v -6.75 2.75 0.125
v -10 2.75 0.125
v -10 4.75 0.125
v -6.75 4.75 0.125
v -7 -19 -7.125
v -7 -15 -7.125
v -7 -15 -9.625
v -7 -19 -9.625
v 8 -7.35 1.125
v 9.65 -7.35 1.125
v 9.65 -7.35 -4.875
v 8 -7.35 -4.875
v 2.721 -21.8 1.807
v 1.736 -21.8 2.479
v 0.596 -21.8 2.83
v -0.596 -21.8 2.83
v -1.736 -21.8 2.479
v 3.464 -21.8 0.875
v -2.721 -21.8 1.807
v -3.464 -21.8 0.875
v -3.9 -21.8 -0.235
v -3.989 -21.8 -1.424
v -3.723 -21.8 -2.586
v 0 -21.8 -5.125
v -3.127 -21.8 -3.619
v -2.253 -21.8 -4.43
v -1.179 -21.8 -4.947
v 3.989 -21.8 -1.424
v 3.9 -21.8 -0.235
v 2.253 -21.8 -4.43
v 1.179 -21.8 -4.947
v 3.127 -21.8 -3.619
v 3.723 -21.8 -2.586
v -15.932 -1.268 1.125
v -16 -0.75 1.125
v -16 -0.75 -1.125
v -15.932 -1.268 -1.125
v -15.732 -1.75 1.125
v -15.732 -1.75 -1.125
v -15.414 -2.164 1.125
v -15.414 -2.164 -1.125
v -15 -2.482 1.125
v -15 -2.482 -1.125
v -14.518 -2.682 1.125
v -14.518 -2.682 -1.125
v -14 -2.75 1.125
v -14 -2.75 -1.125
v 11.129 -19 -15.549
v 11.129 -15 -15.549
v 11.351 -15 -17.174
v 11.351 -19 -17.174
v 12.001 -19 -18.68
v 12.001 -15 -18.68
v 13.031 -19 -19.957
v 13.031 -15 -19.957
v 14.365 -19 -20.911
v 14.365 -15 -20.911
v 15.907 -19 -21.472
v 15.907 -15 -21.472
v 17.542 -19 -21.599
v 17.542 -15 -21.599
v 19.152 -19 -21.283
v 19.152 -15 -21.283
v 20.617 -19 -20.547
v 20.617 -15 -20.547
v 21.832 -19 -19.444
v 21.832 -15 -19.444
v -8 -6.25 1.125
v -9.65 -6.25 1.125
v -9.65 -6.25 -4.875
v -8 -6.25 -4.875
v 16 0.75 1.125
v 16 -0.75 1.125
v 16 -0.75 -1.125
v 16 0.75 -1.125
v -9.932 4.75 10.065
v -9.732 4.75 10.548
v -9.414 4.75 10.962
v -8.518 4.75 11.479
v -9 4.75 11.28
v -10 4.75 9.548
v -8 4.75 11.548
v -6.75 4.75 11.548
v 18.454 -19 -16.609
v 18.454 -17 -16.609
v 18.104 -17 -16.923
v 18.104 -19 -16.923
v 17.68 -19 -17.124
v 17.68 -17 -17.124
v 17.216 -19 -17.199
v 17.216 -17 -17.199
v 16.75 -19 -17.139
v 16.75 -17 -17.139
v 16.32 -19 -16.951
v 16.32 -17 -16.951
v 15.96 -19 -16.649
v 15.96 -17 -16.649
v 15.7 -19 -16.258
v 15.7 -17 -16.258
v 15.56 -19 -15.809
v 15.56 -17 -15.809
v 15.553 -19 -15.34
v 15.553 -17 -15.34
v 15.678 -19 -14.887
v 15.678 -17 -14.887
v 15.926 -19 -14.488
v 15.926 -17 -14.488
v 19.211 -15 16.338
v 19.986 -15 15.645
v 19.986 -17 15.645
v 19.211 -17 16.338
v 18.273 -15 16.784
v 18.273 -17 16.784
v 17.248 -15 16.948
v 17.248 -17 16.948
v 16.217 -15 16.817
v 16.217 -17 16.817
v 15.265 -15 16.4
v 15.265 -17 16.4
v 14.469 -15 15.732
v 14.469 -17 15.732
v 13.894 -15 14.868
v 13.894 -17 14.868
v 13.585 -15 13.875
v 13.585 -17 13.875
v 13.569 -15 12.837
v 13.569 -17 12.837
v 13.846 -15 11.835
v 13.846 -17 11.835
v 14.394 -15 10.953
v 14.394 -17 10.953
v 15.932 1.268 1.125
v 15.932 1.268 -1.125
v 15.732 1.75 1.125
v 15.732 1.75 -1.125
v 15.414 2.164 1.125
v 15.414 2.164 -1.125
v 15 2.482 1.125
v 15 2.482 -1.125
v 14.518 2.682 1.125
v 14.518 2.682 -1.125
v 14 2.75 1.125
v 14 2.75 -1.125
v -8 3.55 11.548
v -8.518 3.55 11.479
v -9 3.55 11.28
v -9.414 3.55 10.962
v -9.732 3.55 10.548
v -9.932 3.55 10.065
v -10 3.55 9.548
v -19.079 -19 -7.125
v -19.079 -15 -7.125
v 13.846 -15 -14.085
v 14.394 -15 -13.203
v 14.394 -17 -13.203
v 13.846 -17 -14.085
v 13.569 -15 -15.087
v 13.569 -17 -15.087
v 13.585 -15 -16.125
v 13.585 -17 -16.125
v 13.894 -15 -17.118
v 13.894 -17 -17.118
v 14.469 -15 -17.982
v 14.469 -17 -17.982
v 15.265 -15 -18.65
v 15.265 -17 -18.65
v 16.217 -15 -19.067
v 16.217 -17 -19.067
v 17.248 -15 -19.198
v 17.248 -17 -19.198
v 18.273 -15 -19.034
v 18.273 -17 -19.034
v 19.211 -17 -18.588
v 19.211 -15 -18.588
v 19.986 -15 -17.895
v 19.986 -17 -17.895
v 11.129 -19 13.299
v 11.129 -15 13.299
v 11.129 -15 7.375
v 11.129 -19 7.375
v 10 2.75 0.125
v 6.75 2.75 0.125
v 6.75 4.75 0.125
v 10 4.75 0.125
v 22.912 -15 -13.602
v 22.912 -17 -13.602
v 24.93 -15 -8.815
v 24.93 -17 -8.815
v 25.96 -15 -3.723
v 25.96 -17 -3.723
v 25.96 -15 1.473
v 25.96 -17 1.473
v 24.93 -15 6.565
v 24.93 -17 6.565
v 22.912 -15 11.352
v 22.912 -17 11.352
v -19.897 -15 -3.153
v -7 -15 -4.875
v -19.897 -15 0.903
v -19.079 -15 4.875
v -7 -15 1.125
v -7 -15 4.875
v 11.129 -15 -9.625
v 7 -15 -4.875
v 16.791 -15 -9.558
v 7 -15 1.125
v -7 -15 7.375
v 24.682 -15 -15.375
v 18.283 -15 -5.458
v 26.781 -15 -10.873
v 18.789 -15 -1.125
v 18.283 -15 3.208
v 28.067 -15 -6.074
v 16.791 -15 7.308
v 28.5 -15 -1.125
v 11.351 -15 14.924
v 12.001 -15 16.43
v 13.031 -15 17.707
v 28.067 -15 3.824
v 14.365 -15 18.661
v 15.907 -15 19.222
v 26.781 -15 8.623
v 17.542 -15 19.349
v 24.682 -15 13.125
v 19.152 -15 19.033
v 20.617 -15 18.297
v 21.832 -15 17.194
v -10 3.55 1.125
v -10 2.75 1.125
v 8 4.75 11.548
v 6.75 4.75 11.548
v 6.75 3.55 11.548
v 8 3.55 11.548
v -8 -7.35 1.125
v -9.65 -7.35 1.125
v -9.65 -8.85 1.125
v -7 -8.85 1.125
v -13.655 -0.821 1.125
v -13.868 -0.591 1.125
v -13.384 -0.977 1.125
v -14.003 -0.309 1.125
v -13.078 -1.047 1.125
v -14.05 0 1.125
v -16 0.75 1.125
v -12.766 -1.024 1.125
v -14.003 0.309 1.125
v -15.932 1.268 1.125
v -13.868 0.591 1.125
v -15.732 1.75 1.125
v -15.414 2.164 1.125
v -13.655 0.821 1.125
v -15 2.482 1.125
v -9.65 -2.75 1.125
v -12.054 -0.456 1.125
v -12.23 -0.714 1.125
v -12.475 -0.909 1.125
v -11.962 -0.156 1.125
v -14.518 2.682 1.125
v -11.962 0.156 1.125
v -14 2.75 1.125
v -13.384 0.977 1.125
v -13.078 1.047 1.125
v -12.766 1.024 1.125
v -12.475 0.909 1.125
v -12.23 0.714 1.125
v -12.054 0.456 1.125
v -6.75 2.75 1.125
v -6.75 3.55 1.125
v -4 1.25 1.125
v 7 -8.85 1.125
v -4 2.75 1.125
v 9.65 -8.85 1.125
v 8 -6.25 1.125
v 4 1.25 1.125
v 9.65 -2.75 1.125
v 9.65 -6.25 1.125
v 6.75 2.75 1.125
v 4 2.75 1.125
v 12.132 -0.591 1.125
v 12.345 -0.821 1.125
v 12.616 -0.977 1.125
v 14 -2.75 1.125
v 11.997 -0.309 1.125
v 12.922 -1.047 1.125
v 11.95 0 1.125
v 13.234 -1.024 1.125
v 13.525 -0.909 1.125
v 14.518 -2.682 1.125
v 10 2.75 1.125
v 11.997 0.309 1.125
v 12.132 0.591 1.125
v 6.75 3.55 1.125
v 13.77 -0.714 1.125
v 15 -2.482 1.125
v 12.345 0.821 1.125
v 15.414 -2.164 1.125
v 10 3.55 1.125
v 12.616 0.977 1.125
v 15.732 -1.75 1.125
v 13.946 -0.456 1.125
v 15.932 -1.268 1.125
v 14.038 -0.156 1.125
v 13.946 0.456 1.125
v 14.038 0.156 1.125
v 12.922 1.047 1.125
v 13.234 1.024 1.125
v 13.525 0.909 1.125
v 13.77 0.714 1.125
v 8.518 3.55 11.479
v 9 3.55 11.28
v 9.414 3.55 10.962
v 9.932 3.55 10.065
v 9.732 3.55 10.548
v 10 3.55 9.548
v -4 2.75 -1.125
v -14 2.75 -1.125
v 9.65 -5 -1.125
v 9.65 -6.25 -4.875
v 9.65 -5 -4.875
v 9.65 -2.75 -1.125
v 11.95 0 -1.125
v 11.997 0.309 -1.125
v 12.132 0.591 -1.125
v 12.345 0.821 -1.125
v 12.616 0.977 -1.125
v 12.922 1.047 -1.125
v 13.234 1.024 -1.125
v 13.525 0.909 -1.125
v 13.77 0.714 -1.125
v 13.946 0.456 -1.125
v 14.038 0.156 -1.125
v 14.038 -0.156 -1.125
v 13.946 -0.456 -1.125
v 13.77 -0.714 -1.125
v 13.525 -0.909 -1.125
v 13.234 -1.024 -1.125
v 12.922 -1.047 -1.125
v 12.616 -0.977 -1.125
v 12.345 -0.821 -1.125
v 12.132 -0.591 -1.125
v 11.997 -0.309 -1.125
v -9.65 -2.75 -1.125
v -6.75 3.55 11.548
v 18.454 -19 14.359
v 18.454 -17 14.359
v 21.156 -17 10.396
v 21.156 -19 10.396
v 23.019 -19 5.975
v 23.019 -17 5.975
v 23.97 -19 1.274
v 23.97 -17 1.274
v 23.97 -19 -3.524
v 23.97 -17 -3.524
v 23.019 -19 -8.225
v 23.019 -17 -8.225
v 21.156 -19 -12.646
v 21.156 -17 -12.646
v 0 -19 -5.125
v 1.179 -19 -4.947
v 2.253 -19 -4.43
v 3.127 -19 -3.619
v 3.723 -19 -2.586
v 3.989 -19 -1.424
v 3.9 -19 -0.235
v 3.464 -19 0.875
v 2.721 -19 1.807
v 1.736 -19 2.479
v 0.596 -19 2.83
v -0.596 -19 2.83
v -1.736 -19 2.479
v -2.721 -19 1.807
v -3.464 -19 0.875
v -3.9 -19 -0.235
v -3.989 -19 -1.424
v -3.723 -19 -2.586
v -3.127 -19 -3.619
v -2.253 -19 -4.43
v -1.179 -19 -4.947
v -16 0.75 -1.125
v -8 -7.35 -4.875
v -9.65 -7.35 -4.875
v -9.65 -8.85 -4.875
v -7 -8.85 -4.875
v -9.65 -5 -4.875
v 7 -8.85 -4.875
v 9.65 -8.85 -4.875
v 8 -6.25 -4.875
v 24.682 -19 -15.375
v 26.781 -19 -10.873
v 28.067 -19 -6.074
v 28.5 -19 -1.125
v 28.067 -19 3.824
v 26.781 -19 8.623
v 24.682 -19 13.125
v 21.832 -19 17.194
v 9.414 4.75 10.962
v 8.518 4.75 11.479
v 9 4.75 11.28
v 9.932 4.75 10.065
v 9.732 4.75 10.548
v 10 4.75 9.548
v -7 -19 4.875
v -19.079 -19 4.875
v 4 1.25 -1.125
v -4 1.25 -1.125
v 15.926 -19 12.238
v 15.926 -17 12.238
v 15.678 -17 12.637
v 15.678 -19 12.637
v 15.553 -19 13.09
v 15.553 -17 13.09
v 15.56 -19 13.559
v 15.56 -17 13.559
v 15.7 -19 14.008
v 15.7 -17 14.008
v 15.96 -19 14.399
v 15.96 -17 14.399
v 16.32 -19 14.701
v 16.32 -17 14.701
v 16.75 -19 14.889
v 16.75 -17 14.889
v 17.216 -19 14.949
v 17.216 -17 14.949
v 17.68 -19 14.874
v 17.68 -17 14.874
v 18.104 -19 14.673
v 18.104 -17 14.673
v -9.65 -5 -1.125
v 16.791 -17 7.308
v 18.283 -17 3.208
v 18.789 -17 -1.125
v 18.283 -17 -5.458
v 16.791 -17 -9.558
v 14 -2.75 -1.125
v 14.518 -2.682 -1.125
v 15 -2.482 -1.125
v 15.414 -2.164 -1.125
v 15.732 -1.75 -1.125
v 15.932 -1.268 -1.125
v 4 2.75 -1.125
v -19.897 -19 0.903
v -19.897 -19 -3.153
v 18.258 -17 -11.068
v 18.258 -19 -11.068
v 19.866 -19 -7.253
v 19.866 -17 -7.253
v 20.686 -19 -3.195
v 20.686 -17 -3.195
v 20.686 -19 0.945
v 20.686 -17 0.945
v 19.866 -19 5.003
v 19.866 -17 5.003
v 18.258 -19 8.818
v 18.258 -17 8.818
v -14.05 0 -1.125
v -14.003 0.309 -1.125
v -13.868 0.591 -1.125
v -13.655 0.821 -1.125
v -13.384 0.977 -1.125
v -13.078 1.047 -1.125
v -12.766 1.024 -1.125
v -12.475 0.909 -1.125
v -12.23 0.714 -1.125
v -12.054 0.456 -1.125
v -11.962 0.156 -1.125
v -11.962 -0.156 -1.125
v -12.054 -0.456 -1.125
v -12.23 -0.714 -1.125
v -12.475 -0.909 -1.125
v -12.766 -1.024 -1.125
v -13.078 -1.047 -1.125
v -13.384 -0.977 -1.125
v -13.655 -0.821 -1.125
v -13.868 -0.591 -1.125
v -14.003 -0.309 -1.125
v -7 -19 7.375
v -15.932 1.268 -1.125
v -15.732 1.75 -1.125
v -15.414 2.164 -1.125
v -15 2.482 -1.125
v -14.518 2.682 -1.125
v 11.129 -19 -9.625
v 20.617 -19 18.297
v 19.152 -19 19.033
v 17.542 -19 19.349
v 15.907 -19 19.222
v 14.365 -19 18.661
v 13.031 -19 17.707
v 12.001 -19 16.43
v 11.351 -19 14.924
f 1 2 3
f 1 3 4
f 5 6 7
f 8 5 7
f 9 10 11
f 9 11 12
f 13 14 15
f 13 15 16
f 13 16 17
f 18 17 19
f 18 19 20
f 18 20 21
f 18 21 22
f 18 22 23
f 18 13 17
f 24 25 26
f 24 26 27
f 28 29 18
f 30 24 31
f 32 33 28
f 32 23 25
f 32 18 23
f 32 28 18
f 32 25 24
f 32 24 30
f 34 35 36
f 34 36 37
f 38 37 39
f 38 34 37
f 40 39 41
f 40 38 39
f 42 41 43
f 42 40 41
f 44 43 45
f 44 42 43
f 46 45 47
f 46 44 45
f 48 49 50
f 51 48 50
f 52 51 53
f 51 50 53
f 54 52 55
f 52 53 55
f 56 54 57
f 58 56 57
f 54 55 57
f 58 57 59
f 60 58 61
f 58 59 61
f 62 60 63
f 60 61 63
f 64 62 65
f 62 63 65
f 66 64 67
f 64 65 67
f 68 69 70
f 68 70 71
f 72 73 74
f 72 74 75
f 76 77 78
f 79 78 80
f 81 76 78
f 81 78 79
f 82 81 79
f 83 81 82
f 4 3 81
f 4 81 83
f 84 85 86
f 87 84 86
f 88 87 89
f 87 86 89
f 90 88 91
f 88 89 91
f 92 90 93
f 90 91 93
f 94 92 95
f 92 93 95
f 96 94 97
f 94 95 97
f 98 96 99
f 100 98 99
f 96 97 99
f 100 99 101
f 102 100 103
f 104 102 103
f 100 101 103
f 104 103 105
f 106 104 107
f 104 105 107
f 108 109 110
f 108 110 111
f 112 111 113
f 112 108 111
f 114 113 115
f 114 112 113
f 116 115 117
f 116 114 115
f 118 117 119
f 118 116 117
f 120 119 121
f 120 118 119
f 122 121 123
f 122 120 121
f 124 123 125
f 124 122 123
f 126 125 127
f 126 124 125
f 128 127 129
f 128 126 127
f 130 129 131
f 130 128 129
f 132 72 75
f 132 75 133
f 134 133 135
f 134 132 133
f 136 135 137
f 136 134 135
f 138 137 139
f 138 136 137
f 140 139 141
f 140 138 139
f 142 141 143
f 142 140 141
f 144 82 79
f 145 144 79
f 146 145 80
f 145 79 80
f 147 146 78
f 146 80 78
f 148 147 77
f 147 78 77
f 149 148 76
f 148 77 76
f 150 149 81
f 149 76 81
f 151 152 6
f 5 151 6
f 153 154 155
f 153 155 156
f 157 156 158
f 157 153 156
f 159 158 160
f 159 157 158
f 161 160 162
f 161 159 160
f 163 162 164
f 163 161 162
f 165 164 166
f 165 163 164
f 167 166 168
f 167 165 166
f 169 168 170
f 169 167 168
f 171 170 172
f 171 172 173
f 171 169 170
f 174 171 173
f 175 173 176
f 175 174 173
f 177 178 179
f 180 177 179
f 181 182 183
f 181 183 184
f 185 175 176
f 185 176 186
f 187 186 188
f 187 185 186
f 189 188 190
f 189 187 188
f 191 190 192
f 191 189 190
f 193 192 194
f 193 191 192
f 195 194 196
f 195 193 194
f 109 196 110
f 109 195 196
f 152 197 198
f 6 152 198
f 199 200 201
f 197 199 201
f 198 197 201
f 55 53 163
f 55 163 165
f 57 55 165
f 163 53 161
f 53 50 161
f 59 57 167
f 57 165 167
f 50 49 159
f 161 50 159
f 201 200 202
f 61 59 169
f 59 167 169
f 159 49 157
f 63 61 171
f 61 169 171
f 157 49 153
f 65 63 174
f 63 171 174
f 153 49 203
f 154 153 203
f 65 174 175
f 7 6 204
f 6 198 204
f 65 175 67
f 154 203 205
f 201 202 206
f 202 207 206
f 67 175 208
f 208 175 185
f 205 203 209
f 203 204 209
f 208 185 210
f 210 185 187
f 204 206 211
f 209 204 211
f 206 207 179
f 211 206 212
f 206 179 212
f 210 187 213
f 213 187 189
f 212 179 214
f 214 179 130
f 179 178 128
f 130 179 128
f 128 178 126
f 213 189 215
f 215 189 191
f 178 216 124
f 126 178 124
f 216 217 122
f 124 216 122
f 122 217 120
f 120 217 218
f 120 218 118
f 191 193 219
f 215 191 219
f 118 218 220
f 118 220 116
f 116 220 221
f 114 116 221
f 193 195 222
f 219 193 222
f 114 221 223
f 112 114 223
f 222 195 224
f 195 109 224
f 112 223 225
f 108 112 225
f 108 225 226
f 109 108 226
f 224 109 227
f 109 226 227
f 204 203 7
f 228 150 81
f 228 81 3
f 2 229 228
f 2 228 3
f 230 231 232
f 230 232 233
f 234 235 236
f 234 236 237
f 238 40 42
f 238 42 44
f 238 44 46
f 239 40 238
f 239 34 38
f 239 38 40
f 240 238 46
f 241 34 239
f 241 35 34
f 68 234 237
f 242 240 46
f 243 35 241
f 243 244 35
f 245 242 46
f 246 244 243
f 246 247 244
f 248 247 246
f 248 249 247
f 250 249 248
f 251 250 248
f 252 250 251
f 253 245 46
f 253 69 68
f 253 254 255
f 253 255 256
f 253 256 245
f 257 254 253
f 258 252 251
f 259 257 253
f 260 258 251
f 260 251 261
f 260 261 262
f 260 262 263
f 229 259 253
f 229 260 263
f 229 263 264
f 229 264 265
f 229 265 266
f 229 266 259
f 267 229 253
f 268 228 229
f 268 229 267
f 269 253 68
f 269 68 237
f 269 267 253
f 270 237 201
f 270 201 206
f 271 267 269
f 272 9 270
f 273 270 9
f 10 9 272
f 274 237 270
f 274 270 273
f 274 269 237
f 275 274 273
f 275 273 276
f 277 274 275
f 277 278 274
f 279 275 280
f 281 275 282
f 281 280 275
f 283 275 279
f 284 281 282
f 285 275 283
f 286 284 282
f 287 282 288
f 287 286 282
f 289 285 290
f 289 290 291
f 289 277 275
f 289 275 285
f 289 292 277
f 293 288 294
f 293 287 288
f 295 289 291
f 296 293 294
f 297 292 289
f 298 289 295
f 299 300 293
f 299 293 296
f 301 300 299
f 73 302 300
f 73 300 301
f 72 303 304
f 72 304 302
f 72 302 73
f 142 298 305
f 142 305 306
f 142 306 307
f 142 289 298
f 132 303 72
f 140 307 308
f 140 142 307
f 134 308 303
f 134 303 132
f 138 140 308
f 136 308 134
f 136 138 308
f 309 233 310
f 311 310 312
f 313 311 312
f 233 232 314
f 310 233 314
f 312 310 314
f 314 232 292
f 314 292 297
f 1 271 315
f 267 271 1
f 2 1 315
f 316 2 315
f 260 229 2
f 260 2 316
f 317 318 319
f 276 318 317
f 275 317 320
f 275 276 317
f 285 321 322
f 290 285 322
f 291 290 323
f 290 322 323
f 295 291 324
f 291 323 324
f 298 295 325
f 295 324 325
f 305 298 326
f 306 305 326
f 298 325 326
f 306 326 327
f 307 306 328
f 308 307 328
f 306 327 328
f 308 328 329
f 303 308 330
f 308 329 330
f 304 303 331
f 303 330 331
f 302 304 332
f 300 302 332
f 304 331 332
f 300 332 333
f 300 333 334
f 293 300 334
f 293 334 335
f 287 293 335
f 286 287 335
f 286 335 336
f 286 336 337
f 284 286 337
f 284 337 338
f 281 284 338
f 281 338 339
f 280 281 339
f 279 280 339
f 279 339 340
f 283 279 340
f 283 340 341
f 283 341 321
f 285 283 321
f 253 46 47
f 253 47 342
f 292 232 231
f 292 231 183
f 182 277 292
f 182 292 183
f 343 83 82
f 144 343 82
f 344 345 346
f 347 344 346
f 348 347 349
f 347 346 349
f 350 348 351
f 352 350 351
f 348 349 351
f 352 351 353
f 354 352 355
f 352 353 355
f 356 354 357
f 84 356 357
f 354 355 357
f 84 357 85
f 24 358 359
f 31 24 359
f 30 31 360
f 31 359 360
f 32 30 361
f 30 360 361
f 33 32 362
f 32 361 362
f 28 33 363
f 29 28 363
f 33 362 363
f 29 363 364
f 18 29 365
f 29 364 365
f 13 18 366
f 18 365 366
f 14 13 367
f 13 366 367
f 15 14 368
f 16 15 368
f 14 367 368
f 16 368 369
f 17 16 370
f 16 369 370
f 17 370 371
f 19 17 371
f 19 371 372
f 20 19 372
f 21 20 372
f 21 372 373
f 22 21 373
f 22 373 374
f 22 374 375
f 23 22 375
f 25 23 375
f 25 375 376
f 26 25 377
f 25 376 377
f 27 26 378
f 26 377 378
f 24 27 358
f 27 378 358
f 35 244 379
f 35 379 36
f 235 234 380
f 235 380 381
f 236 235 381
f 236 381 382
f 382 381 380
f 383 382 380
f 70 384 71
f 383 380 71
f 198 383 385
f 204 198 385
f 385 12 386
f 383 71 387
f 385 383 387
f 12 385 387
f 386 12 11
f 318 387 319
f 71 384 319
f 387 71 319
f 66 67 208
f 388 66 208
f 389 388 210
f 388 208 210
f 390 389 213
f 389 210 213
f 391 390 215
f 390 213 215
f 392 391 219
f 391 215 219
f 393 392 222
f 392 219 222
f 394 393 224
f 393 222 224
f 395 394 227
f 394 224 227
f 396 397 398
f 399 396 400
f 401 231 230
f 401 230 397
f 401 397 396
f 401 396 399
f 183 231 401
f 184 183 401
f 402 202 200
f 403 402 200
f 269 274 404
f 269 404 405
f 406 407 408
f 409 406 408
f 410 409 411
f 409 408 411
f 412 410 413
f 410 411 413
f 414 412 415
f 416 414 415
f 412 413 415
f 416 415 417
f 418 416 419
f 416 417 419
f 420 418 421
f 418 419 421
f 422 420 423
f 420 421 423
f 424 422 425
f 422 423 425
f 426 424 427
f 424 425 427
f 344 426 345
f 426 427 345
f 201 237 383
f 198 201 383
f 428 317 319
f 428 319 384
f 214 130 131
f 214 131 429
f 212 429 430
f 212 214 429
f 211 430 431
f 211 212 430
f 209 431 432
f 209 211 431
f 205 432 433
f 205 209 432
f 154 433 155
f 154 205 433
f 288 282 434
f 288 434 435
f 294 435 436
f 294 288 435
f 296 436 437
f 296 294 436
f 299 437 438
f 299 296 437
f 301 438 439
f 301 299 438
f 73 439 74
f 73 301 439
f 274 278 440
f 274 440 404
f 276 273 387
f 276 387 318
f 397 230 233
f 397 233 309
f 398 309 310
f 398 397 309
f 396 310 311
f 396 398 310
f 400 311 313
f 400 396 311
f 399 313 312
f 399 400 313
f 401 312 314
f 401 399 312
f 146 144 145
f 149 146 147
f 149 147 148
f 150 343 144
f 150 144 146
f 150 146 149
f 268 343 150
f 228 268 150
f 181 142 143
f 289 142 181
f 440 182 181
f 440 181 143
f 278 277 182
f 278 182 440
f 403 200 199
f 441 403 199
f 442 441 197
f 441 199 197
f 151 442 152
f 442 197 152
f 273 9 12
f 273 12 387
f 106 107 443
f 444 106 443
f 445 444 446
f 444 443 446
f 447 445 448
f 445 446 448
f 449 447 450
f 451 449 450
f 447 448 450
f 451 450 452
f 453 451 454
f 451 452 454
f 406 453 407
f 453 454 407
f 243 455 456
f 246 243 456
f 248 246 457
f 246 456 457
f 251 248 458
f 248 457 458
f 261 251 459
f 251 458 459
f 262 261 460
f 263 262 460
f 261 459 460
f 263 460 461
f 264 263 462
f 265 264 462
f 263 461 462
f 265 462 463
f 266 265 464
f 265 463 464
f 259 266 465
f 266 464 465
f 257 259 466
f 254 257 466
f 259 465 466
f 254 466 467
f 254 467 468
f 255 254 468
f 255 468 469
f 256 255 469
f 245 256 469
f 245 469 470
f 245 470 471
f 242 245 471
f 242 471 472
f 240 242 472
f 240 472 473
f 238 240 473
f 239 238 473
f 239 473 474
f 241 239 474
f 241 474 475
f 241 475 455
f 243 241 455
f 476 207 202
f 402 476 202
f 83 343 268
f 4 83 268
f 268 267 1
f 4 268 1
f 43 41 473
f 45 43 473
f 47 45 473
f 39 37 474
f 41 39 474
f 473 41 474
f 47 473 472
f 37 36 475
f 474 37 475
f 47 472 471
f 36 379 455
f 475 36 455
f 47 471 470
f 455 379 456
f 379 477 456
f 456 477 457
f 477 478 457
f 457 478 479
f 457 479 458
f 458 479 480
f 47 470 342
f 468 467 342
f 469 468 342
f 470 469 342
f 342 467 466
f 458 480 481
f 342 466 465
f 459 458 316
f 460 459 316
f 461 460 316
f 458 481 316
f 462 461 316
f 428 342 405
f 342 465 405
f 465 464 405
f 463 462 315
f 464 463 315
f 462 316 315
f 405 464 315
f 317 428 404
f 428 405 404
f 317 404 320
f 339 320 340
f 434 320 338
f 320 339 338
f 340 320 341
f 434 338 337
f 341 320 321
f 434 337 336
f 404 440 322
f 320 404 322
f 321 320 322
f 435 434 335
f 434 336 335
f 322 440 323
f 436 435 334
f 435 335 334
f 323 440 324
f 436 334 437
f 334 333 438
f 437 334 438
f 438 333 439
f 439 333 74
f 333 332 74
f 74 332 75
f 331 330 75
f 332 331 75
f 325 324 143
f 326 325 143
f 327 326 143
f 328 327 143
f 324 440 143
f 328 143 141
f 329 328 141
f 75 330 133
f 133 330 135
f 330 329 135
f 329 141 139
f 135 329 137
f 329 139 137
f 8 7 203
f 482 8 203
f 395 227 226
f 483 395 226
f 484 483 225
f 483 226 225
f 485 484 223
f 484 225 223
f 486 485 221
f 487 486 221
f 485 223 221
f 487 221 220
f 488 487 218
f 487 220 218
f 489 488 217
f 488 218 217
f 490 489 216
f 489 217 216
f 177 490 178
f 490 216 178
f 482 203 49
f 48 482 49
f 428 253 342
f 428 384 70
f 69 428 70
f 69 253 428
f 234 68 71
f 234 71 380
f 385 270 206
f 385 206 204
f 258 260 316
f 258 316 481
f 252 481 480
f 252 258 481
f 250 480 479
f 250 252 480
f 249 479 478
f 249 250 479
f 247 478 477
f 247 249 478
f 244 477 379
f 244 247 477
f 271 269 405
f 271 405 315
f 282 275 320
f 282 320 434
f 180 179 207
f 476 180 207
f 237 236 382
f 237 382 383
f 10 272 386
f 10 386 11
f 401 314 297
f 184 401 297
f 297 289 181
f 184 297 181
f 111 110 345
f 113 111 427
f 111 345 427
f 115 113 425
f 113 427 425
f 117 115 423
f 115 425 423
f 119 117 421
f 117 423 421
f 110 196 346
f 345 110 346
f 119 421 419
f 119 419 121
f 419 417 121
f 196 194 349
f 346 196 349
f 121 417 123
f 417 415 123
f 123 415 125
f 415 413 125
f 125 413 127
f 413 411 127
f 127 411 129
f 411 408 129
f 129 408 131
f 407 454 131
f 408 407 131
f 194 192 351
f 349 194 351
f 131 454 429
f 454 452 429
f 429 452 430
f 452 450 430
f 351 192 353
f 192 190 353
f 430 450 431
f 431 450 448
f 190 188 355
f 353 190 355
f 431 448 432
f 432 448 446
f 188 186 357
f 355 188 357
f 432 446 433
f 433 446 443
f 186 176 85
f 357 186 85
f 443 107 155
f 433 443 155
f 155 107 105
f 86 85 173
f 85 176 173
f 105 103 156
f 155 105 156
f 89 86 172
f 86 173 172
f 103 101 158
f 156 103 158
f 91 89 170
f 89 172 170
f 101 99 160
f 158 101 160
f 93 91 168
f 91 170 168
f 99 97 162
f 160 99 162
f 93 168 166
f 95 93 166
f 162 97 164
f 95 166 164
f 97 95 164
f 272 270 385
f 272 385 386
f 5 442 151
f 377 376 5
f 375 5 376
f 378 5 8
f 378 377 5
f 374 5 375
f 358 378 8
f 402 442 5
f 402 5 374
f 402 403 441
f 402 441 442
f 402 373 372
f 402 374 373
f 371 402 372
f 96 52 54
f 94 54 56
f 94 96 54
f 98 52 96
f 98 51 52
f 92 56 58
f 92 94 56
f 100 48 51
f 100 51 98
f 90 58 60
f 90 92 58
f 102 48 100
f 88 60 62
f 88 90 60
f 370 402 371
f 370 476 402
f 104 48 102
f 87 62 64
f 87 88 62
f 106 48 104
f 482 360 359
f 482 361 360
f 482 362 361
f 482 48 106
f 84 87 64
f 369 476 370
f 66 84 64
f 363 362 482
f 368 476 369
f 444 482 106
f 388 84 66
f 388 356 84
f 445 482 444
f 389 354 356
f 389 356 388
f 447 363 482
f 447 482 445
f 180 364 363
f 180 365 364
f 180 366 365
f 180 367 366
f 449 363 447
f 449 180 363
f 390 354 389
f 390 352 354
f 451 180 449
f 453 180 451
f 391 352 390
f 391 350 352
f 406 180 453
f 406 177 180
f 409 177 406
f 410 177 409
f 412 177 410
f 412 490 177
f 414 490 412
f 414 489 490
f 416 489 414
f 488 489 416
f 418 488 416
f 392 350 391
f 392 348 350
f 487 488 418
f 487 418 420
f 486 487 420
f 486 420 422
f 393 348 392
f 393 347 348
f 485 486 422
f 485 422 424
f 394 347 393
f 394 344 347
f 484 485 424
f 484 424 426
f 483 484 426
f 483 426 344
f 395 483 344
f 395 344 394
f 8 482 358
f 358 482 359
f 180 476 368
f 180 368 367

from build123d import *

# Parameters (mm, degrees)
BOSS_EXTRUDE1_DEPTH    = 1.125
M1_8_CLEARANCE_HOLE1_D = 2.1
BOSS_EXTRUDE3_DEPTH    = 4
SKETCH10_R             = 4
BOSS_EXTRUDE4_DEPTH    = 2.8
CUT_EXTRUDE1_DEPTH     = 2
BOSS_EXTRUDE9_DEPTH    = 6
SKETCH21_W             = 3.25
SKETCH21_H             = 1
BOSS_EXTRUDE10_DEPTH   = 2
BOSS_EXTRUDE13_DEPTH   = 1.2
SKETCH25_W             = 14
SKETCH25_H             = 3.75
BOSS_EXTRUDE12_DEPTH   = 10


with BuildPart() as part:
    # Sketch1 → Boss-Extrude1 (new, symmetric)
    with BuildSketch(Plane.XY):
        with BuildLine():
            Line((-7, -8.85), (-7, -15))
            Line((-7, -15), (7, -15))
            Line((7, -15), (7, -8.85))
            Line((7, -8.85), (9.65, -8.85))
            Line((9.65, -8.85), (9.65, -7.35))
            Line((9.65, -7.35), (8, -7.35))
            Line((8, -7.35), (8, -6.25))
            Line((8, -6.25), (9.65, -6.25))
            Line((9.65, -6.25), (9.65, -2.75))
            Line((9.65, -2.75), (14, -2.75))
            ThreePointArc((14, -2.75), (15.414213562, -2.164213562), (16, -0.75))
            Line((16, -0.75), (16, 0.75))
            ThreePointArc((16, 0.75), (15.414213562, 2.164213562), (14, 2.75))
            Line((14, 2.75), (4, 2.75))
            Line((4, 2.75), (4, 1.25))
            Line((4, 1.25), (-4, 1.25))
            Line((-4, 1.25), (-4, 2.75))
            Line((-4, 2.75), (-14, 2.75))
            ThreePointArc((-14, 2.75), (-15.414213562, 2.164213562), (-16, 0.75))
            Line((-16, 0.75), (-16, -0.75))
            ThreePointArc((-16, -0.75), (-15.414213562, -2.164213562), (-14, -2.75))
            Line((-14, -2.75), (-9.65, -2.75))
            Line((-9.65, -2.75), (-9.65, -6.25))
            Line((-9.65, -6.25), (-8, -6.25))
            Line((-8, -6.25), (-8, -7.35))
            Line((-8, -7.35), (-9.65, -7.35))
            Line((-9.65, -7.35), (-9.65, -8.85))
            Line((-9.65, -8.85), (-7, -8.85))
        make_face()
    extrude(amount=BOSS_EXTRUDE1_DEPTH, both=True)

    # M1.8 Clearance Hole1 (through all)
    with Locations(Plane.XY.offset(1.125)):
        with Locations((-13, 0), (13, 0)):
            Hole(M1_8_CLEARANCE_HOLE1_D / 2)

    # Sketch8 → Boss-Extrude3 (add)
    with BuildSketch(Plane.XZ.offset(15)):
        with BuildLine():
            Line((-7, -7.125), (-7, -9.625))
            Line((-7, -9.625), (11.129010548, -9.625))
            Line((11.129010548, -9.625), (11.129010548, -15.548780253))
            ThreePointArc((11.129010548, -15.548780253), (15.116751021, -21.24386386), (21.832266629, -19.444446876))
            ThreePointArc((21.832266629, -19.444446876), (28.5, -1.125), (21.832266629, 17.194446876))
            ThreePointArc((21.832266629, 17.194446876), (15.116751021, 18.99386386), (11.129010548, 13.298780253))
            Line((11.129010548, 13.298780253), (11.129010548, 7.375))
            Line((11.129010548, 7.375), (-7, 7.375))
            Line((-7, 7.375), (-7, 4.875))
            Line((-7, 4.875), (-19.078784028, 4.875))
            ThreePointArc((-19.078784028, 4.875), (-20, -1.125), (-19.078784028, -7.125))
            Line((-19.078784028, -7.125), (-7, -7.125))
        make_face()
        with BuildLine():
            ThreePointArc((15.925618604, -14.488180697), (20.789418613, -1.125), (15.925618604, 12.238180697))
            ThreePointArc((15.925618604, 12.238180697), (16.128992379, 14.562753584), (18.453565266, 14.359379809))
            ThreePointArc((18.453565266, 14.359379809), (24.089418613, -1.125000171), (18.453565046, -16.609380071))
            ThreePointArc((18.453565046, -16.609380071), (16.128992248, -16.812753474), (15.925618604, -14.488180697))
        make_face(mode=Mode.SUBTRACT)
    extrude(amount=BOSS_EXTRUDE3_DEPTH)

    # Sketch10 → Boss-Extrude4 (add)
    with BuildSketch(Plane(origin=(0, -19, 0), x_dir=(-1, 0, 0), z_dir=(0, -1, 0))):
        with Locations(Location((0, 1.125, 0), (0, 0, 90))):
            Circle(SKETCH10_R)
    extrude(amount=BOSS_EXTRUDE4_DEPTH)

    # Sketch11 → Cut-Extrude1 (cut)
    with BuildSketch(Plane(origin=(0, -15, 0), x_dir=(1, 0, 0), z_dir=(0, 1, 0))):
        with BuildLine():
            ThreePointArc((14.393529718, -10.952605478), (18.789418613, 1.125), (14.393529718, 13.202605478))
            ThreePointArc((14.393529718, 13.202605478), (14.84341687, 18.344842227), (19.985653666, 17.894955608))
            ThreePointArc((19.985653666, 17.894955608), (26.089418613, 1.125000379), (19.985654153, -15.644955028))
            ThreePointArc((19.985654153, -15.644955028), (14.84341716, -16.09484247), (14.393529718, -10.952605478))
        make_face()
        with BuildLine():
            ThreePointArc((18.453565046, 16.609380071), (16.128992248, 16.812753474), (15.925618604, 14.488180697))
            ThreePointArc((15.925618604, 14.488180697), (20.789418613, 1.125), (15.925618604, -12.238180697))
            ThreePointArc((15.925618604, -12.238180697), (16.128992379, -14.562753584), (18.453565266, -14.359379809))
            ThreePointArc((18.453565266, -14.359379809), (24.089418613, 1.125000171), (18.453565046, 16.609380071))
        make_face(mode=Mode.SUBTRACT)
    extrude(amount=-CUT_EXTRUDE1_DEPTH, mode=Mode.SUBTRACT)

    # Sketch19 → Boss-Extrude9 (add)
    with BuildSketch(Plane.XY.offset(1.125)):
        Polygon((-9.65, -5), (-9.65, -6.25), (-8, -6.25), (-8, -7.35), (-9.65, -7.35), (-9.65, -8.85), (-6.6, -8.85), (-6.6, -5), align=None)
    boss_extrude9 = extrude(amount=-BOSS_EXTRUDE9_DEPTH)

    # Mirror1: Boss-Extrude9 across plane
    add(boss_extrude9.mirror(Plane(origin=(0, 0, 0), x_dir=(0, 0, 1), z_dir=(1, 0, 0))))

    # Sketch21 → Boss-Extrude10 (add)
    with BuildSketch(Plane(origin=(0, 2.75, 0), x_dir=(1, 0, 0), z_dir=(0, 1, 0))):
        with Locations((-8.375, -0.625)):
            Rectangle(SKETCH21_W, SKETCH21_H)
        with Locations((8.375, -0.625)):
            Rectangle(SKETCH21_W, SKETCH21_H)
    extrude(amount=BOSS_EXTRUDE10_DEPTH)

    # Sketch26 → Boss-Extrude13 (add)
    with BuildSketch(Plane(origin=(0, 4.75, 0), x_dir=(1, 0, 0), z_dir=(0, 1, 0))):
        with BuildLine():
            Line((-10, -0.125), (-6.75, -0.125))
            Line((-6.75, -0.125), (-6.75, -11.547583435))
            Line((-6.75, -11.547583435), (-8, -11.547583435))
            ThreePointArc((-8, -11.547583435), (-9.414213562, -10.961796997), (-10, -9.547583435))
            Line((-10, -9.547583435), (-10, -0.125))
        make_face()
        with BuildLine():
            Line((6.75, -0.125), (6.75, -11.547583435))
            Line((6.75, -11.547583435), (8, -11.547583435))
            ThreePointArc((8, -11.547583435), (9.414213562, -10.961796997), (10, -9.547583435))
            Line((10, -9.547583435), (10, -0.125))
            Line((10, -0.125), (6.75, -0.125))
        make_face()
    extrude(amount=-BOSS_EXTRUDE13_DEPTH)

    # Sketch25 → Boss-Extrude12 (add)
    with BuildSketch(Plane(origin=(0, -5, 0), x_dir=(1, 0, 0), z_dir=(0, 1, 0))):
        with Locations((0, 3)):
            Rectangle(SKETCH25_W, SKETCH25_H)
    extrude(amount=-BOSS_EXTRUDE12_DEPTH)


solid = part.part
